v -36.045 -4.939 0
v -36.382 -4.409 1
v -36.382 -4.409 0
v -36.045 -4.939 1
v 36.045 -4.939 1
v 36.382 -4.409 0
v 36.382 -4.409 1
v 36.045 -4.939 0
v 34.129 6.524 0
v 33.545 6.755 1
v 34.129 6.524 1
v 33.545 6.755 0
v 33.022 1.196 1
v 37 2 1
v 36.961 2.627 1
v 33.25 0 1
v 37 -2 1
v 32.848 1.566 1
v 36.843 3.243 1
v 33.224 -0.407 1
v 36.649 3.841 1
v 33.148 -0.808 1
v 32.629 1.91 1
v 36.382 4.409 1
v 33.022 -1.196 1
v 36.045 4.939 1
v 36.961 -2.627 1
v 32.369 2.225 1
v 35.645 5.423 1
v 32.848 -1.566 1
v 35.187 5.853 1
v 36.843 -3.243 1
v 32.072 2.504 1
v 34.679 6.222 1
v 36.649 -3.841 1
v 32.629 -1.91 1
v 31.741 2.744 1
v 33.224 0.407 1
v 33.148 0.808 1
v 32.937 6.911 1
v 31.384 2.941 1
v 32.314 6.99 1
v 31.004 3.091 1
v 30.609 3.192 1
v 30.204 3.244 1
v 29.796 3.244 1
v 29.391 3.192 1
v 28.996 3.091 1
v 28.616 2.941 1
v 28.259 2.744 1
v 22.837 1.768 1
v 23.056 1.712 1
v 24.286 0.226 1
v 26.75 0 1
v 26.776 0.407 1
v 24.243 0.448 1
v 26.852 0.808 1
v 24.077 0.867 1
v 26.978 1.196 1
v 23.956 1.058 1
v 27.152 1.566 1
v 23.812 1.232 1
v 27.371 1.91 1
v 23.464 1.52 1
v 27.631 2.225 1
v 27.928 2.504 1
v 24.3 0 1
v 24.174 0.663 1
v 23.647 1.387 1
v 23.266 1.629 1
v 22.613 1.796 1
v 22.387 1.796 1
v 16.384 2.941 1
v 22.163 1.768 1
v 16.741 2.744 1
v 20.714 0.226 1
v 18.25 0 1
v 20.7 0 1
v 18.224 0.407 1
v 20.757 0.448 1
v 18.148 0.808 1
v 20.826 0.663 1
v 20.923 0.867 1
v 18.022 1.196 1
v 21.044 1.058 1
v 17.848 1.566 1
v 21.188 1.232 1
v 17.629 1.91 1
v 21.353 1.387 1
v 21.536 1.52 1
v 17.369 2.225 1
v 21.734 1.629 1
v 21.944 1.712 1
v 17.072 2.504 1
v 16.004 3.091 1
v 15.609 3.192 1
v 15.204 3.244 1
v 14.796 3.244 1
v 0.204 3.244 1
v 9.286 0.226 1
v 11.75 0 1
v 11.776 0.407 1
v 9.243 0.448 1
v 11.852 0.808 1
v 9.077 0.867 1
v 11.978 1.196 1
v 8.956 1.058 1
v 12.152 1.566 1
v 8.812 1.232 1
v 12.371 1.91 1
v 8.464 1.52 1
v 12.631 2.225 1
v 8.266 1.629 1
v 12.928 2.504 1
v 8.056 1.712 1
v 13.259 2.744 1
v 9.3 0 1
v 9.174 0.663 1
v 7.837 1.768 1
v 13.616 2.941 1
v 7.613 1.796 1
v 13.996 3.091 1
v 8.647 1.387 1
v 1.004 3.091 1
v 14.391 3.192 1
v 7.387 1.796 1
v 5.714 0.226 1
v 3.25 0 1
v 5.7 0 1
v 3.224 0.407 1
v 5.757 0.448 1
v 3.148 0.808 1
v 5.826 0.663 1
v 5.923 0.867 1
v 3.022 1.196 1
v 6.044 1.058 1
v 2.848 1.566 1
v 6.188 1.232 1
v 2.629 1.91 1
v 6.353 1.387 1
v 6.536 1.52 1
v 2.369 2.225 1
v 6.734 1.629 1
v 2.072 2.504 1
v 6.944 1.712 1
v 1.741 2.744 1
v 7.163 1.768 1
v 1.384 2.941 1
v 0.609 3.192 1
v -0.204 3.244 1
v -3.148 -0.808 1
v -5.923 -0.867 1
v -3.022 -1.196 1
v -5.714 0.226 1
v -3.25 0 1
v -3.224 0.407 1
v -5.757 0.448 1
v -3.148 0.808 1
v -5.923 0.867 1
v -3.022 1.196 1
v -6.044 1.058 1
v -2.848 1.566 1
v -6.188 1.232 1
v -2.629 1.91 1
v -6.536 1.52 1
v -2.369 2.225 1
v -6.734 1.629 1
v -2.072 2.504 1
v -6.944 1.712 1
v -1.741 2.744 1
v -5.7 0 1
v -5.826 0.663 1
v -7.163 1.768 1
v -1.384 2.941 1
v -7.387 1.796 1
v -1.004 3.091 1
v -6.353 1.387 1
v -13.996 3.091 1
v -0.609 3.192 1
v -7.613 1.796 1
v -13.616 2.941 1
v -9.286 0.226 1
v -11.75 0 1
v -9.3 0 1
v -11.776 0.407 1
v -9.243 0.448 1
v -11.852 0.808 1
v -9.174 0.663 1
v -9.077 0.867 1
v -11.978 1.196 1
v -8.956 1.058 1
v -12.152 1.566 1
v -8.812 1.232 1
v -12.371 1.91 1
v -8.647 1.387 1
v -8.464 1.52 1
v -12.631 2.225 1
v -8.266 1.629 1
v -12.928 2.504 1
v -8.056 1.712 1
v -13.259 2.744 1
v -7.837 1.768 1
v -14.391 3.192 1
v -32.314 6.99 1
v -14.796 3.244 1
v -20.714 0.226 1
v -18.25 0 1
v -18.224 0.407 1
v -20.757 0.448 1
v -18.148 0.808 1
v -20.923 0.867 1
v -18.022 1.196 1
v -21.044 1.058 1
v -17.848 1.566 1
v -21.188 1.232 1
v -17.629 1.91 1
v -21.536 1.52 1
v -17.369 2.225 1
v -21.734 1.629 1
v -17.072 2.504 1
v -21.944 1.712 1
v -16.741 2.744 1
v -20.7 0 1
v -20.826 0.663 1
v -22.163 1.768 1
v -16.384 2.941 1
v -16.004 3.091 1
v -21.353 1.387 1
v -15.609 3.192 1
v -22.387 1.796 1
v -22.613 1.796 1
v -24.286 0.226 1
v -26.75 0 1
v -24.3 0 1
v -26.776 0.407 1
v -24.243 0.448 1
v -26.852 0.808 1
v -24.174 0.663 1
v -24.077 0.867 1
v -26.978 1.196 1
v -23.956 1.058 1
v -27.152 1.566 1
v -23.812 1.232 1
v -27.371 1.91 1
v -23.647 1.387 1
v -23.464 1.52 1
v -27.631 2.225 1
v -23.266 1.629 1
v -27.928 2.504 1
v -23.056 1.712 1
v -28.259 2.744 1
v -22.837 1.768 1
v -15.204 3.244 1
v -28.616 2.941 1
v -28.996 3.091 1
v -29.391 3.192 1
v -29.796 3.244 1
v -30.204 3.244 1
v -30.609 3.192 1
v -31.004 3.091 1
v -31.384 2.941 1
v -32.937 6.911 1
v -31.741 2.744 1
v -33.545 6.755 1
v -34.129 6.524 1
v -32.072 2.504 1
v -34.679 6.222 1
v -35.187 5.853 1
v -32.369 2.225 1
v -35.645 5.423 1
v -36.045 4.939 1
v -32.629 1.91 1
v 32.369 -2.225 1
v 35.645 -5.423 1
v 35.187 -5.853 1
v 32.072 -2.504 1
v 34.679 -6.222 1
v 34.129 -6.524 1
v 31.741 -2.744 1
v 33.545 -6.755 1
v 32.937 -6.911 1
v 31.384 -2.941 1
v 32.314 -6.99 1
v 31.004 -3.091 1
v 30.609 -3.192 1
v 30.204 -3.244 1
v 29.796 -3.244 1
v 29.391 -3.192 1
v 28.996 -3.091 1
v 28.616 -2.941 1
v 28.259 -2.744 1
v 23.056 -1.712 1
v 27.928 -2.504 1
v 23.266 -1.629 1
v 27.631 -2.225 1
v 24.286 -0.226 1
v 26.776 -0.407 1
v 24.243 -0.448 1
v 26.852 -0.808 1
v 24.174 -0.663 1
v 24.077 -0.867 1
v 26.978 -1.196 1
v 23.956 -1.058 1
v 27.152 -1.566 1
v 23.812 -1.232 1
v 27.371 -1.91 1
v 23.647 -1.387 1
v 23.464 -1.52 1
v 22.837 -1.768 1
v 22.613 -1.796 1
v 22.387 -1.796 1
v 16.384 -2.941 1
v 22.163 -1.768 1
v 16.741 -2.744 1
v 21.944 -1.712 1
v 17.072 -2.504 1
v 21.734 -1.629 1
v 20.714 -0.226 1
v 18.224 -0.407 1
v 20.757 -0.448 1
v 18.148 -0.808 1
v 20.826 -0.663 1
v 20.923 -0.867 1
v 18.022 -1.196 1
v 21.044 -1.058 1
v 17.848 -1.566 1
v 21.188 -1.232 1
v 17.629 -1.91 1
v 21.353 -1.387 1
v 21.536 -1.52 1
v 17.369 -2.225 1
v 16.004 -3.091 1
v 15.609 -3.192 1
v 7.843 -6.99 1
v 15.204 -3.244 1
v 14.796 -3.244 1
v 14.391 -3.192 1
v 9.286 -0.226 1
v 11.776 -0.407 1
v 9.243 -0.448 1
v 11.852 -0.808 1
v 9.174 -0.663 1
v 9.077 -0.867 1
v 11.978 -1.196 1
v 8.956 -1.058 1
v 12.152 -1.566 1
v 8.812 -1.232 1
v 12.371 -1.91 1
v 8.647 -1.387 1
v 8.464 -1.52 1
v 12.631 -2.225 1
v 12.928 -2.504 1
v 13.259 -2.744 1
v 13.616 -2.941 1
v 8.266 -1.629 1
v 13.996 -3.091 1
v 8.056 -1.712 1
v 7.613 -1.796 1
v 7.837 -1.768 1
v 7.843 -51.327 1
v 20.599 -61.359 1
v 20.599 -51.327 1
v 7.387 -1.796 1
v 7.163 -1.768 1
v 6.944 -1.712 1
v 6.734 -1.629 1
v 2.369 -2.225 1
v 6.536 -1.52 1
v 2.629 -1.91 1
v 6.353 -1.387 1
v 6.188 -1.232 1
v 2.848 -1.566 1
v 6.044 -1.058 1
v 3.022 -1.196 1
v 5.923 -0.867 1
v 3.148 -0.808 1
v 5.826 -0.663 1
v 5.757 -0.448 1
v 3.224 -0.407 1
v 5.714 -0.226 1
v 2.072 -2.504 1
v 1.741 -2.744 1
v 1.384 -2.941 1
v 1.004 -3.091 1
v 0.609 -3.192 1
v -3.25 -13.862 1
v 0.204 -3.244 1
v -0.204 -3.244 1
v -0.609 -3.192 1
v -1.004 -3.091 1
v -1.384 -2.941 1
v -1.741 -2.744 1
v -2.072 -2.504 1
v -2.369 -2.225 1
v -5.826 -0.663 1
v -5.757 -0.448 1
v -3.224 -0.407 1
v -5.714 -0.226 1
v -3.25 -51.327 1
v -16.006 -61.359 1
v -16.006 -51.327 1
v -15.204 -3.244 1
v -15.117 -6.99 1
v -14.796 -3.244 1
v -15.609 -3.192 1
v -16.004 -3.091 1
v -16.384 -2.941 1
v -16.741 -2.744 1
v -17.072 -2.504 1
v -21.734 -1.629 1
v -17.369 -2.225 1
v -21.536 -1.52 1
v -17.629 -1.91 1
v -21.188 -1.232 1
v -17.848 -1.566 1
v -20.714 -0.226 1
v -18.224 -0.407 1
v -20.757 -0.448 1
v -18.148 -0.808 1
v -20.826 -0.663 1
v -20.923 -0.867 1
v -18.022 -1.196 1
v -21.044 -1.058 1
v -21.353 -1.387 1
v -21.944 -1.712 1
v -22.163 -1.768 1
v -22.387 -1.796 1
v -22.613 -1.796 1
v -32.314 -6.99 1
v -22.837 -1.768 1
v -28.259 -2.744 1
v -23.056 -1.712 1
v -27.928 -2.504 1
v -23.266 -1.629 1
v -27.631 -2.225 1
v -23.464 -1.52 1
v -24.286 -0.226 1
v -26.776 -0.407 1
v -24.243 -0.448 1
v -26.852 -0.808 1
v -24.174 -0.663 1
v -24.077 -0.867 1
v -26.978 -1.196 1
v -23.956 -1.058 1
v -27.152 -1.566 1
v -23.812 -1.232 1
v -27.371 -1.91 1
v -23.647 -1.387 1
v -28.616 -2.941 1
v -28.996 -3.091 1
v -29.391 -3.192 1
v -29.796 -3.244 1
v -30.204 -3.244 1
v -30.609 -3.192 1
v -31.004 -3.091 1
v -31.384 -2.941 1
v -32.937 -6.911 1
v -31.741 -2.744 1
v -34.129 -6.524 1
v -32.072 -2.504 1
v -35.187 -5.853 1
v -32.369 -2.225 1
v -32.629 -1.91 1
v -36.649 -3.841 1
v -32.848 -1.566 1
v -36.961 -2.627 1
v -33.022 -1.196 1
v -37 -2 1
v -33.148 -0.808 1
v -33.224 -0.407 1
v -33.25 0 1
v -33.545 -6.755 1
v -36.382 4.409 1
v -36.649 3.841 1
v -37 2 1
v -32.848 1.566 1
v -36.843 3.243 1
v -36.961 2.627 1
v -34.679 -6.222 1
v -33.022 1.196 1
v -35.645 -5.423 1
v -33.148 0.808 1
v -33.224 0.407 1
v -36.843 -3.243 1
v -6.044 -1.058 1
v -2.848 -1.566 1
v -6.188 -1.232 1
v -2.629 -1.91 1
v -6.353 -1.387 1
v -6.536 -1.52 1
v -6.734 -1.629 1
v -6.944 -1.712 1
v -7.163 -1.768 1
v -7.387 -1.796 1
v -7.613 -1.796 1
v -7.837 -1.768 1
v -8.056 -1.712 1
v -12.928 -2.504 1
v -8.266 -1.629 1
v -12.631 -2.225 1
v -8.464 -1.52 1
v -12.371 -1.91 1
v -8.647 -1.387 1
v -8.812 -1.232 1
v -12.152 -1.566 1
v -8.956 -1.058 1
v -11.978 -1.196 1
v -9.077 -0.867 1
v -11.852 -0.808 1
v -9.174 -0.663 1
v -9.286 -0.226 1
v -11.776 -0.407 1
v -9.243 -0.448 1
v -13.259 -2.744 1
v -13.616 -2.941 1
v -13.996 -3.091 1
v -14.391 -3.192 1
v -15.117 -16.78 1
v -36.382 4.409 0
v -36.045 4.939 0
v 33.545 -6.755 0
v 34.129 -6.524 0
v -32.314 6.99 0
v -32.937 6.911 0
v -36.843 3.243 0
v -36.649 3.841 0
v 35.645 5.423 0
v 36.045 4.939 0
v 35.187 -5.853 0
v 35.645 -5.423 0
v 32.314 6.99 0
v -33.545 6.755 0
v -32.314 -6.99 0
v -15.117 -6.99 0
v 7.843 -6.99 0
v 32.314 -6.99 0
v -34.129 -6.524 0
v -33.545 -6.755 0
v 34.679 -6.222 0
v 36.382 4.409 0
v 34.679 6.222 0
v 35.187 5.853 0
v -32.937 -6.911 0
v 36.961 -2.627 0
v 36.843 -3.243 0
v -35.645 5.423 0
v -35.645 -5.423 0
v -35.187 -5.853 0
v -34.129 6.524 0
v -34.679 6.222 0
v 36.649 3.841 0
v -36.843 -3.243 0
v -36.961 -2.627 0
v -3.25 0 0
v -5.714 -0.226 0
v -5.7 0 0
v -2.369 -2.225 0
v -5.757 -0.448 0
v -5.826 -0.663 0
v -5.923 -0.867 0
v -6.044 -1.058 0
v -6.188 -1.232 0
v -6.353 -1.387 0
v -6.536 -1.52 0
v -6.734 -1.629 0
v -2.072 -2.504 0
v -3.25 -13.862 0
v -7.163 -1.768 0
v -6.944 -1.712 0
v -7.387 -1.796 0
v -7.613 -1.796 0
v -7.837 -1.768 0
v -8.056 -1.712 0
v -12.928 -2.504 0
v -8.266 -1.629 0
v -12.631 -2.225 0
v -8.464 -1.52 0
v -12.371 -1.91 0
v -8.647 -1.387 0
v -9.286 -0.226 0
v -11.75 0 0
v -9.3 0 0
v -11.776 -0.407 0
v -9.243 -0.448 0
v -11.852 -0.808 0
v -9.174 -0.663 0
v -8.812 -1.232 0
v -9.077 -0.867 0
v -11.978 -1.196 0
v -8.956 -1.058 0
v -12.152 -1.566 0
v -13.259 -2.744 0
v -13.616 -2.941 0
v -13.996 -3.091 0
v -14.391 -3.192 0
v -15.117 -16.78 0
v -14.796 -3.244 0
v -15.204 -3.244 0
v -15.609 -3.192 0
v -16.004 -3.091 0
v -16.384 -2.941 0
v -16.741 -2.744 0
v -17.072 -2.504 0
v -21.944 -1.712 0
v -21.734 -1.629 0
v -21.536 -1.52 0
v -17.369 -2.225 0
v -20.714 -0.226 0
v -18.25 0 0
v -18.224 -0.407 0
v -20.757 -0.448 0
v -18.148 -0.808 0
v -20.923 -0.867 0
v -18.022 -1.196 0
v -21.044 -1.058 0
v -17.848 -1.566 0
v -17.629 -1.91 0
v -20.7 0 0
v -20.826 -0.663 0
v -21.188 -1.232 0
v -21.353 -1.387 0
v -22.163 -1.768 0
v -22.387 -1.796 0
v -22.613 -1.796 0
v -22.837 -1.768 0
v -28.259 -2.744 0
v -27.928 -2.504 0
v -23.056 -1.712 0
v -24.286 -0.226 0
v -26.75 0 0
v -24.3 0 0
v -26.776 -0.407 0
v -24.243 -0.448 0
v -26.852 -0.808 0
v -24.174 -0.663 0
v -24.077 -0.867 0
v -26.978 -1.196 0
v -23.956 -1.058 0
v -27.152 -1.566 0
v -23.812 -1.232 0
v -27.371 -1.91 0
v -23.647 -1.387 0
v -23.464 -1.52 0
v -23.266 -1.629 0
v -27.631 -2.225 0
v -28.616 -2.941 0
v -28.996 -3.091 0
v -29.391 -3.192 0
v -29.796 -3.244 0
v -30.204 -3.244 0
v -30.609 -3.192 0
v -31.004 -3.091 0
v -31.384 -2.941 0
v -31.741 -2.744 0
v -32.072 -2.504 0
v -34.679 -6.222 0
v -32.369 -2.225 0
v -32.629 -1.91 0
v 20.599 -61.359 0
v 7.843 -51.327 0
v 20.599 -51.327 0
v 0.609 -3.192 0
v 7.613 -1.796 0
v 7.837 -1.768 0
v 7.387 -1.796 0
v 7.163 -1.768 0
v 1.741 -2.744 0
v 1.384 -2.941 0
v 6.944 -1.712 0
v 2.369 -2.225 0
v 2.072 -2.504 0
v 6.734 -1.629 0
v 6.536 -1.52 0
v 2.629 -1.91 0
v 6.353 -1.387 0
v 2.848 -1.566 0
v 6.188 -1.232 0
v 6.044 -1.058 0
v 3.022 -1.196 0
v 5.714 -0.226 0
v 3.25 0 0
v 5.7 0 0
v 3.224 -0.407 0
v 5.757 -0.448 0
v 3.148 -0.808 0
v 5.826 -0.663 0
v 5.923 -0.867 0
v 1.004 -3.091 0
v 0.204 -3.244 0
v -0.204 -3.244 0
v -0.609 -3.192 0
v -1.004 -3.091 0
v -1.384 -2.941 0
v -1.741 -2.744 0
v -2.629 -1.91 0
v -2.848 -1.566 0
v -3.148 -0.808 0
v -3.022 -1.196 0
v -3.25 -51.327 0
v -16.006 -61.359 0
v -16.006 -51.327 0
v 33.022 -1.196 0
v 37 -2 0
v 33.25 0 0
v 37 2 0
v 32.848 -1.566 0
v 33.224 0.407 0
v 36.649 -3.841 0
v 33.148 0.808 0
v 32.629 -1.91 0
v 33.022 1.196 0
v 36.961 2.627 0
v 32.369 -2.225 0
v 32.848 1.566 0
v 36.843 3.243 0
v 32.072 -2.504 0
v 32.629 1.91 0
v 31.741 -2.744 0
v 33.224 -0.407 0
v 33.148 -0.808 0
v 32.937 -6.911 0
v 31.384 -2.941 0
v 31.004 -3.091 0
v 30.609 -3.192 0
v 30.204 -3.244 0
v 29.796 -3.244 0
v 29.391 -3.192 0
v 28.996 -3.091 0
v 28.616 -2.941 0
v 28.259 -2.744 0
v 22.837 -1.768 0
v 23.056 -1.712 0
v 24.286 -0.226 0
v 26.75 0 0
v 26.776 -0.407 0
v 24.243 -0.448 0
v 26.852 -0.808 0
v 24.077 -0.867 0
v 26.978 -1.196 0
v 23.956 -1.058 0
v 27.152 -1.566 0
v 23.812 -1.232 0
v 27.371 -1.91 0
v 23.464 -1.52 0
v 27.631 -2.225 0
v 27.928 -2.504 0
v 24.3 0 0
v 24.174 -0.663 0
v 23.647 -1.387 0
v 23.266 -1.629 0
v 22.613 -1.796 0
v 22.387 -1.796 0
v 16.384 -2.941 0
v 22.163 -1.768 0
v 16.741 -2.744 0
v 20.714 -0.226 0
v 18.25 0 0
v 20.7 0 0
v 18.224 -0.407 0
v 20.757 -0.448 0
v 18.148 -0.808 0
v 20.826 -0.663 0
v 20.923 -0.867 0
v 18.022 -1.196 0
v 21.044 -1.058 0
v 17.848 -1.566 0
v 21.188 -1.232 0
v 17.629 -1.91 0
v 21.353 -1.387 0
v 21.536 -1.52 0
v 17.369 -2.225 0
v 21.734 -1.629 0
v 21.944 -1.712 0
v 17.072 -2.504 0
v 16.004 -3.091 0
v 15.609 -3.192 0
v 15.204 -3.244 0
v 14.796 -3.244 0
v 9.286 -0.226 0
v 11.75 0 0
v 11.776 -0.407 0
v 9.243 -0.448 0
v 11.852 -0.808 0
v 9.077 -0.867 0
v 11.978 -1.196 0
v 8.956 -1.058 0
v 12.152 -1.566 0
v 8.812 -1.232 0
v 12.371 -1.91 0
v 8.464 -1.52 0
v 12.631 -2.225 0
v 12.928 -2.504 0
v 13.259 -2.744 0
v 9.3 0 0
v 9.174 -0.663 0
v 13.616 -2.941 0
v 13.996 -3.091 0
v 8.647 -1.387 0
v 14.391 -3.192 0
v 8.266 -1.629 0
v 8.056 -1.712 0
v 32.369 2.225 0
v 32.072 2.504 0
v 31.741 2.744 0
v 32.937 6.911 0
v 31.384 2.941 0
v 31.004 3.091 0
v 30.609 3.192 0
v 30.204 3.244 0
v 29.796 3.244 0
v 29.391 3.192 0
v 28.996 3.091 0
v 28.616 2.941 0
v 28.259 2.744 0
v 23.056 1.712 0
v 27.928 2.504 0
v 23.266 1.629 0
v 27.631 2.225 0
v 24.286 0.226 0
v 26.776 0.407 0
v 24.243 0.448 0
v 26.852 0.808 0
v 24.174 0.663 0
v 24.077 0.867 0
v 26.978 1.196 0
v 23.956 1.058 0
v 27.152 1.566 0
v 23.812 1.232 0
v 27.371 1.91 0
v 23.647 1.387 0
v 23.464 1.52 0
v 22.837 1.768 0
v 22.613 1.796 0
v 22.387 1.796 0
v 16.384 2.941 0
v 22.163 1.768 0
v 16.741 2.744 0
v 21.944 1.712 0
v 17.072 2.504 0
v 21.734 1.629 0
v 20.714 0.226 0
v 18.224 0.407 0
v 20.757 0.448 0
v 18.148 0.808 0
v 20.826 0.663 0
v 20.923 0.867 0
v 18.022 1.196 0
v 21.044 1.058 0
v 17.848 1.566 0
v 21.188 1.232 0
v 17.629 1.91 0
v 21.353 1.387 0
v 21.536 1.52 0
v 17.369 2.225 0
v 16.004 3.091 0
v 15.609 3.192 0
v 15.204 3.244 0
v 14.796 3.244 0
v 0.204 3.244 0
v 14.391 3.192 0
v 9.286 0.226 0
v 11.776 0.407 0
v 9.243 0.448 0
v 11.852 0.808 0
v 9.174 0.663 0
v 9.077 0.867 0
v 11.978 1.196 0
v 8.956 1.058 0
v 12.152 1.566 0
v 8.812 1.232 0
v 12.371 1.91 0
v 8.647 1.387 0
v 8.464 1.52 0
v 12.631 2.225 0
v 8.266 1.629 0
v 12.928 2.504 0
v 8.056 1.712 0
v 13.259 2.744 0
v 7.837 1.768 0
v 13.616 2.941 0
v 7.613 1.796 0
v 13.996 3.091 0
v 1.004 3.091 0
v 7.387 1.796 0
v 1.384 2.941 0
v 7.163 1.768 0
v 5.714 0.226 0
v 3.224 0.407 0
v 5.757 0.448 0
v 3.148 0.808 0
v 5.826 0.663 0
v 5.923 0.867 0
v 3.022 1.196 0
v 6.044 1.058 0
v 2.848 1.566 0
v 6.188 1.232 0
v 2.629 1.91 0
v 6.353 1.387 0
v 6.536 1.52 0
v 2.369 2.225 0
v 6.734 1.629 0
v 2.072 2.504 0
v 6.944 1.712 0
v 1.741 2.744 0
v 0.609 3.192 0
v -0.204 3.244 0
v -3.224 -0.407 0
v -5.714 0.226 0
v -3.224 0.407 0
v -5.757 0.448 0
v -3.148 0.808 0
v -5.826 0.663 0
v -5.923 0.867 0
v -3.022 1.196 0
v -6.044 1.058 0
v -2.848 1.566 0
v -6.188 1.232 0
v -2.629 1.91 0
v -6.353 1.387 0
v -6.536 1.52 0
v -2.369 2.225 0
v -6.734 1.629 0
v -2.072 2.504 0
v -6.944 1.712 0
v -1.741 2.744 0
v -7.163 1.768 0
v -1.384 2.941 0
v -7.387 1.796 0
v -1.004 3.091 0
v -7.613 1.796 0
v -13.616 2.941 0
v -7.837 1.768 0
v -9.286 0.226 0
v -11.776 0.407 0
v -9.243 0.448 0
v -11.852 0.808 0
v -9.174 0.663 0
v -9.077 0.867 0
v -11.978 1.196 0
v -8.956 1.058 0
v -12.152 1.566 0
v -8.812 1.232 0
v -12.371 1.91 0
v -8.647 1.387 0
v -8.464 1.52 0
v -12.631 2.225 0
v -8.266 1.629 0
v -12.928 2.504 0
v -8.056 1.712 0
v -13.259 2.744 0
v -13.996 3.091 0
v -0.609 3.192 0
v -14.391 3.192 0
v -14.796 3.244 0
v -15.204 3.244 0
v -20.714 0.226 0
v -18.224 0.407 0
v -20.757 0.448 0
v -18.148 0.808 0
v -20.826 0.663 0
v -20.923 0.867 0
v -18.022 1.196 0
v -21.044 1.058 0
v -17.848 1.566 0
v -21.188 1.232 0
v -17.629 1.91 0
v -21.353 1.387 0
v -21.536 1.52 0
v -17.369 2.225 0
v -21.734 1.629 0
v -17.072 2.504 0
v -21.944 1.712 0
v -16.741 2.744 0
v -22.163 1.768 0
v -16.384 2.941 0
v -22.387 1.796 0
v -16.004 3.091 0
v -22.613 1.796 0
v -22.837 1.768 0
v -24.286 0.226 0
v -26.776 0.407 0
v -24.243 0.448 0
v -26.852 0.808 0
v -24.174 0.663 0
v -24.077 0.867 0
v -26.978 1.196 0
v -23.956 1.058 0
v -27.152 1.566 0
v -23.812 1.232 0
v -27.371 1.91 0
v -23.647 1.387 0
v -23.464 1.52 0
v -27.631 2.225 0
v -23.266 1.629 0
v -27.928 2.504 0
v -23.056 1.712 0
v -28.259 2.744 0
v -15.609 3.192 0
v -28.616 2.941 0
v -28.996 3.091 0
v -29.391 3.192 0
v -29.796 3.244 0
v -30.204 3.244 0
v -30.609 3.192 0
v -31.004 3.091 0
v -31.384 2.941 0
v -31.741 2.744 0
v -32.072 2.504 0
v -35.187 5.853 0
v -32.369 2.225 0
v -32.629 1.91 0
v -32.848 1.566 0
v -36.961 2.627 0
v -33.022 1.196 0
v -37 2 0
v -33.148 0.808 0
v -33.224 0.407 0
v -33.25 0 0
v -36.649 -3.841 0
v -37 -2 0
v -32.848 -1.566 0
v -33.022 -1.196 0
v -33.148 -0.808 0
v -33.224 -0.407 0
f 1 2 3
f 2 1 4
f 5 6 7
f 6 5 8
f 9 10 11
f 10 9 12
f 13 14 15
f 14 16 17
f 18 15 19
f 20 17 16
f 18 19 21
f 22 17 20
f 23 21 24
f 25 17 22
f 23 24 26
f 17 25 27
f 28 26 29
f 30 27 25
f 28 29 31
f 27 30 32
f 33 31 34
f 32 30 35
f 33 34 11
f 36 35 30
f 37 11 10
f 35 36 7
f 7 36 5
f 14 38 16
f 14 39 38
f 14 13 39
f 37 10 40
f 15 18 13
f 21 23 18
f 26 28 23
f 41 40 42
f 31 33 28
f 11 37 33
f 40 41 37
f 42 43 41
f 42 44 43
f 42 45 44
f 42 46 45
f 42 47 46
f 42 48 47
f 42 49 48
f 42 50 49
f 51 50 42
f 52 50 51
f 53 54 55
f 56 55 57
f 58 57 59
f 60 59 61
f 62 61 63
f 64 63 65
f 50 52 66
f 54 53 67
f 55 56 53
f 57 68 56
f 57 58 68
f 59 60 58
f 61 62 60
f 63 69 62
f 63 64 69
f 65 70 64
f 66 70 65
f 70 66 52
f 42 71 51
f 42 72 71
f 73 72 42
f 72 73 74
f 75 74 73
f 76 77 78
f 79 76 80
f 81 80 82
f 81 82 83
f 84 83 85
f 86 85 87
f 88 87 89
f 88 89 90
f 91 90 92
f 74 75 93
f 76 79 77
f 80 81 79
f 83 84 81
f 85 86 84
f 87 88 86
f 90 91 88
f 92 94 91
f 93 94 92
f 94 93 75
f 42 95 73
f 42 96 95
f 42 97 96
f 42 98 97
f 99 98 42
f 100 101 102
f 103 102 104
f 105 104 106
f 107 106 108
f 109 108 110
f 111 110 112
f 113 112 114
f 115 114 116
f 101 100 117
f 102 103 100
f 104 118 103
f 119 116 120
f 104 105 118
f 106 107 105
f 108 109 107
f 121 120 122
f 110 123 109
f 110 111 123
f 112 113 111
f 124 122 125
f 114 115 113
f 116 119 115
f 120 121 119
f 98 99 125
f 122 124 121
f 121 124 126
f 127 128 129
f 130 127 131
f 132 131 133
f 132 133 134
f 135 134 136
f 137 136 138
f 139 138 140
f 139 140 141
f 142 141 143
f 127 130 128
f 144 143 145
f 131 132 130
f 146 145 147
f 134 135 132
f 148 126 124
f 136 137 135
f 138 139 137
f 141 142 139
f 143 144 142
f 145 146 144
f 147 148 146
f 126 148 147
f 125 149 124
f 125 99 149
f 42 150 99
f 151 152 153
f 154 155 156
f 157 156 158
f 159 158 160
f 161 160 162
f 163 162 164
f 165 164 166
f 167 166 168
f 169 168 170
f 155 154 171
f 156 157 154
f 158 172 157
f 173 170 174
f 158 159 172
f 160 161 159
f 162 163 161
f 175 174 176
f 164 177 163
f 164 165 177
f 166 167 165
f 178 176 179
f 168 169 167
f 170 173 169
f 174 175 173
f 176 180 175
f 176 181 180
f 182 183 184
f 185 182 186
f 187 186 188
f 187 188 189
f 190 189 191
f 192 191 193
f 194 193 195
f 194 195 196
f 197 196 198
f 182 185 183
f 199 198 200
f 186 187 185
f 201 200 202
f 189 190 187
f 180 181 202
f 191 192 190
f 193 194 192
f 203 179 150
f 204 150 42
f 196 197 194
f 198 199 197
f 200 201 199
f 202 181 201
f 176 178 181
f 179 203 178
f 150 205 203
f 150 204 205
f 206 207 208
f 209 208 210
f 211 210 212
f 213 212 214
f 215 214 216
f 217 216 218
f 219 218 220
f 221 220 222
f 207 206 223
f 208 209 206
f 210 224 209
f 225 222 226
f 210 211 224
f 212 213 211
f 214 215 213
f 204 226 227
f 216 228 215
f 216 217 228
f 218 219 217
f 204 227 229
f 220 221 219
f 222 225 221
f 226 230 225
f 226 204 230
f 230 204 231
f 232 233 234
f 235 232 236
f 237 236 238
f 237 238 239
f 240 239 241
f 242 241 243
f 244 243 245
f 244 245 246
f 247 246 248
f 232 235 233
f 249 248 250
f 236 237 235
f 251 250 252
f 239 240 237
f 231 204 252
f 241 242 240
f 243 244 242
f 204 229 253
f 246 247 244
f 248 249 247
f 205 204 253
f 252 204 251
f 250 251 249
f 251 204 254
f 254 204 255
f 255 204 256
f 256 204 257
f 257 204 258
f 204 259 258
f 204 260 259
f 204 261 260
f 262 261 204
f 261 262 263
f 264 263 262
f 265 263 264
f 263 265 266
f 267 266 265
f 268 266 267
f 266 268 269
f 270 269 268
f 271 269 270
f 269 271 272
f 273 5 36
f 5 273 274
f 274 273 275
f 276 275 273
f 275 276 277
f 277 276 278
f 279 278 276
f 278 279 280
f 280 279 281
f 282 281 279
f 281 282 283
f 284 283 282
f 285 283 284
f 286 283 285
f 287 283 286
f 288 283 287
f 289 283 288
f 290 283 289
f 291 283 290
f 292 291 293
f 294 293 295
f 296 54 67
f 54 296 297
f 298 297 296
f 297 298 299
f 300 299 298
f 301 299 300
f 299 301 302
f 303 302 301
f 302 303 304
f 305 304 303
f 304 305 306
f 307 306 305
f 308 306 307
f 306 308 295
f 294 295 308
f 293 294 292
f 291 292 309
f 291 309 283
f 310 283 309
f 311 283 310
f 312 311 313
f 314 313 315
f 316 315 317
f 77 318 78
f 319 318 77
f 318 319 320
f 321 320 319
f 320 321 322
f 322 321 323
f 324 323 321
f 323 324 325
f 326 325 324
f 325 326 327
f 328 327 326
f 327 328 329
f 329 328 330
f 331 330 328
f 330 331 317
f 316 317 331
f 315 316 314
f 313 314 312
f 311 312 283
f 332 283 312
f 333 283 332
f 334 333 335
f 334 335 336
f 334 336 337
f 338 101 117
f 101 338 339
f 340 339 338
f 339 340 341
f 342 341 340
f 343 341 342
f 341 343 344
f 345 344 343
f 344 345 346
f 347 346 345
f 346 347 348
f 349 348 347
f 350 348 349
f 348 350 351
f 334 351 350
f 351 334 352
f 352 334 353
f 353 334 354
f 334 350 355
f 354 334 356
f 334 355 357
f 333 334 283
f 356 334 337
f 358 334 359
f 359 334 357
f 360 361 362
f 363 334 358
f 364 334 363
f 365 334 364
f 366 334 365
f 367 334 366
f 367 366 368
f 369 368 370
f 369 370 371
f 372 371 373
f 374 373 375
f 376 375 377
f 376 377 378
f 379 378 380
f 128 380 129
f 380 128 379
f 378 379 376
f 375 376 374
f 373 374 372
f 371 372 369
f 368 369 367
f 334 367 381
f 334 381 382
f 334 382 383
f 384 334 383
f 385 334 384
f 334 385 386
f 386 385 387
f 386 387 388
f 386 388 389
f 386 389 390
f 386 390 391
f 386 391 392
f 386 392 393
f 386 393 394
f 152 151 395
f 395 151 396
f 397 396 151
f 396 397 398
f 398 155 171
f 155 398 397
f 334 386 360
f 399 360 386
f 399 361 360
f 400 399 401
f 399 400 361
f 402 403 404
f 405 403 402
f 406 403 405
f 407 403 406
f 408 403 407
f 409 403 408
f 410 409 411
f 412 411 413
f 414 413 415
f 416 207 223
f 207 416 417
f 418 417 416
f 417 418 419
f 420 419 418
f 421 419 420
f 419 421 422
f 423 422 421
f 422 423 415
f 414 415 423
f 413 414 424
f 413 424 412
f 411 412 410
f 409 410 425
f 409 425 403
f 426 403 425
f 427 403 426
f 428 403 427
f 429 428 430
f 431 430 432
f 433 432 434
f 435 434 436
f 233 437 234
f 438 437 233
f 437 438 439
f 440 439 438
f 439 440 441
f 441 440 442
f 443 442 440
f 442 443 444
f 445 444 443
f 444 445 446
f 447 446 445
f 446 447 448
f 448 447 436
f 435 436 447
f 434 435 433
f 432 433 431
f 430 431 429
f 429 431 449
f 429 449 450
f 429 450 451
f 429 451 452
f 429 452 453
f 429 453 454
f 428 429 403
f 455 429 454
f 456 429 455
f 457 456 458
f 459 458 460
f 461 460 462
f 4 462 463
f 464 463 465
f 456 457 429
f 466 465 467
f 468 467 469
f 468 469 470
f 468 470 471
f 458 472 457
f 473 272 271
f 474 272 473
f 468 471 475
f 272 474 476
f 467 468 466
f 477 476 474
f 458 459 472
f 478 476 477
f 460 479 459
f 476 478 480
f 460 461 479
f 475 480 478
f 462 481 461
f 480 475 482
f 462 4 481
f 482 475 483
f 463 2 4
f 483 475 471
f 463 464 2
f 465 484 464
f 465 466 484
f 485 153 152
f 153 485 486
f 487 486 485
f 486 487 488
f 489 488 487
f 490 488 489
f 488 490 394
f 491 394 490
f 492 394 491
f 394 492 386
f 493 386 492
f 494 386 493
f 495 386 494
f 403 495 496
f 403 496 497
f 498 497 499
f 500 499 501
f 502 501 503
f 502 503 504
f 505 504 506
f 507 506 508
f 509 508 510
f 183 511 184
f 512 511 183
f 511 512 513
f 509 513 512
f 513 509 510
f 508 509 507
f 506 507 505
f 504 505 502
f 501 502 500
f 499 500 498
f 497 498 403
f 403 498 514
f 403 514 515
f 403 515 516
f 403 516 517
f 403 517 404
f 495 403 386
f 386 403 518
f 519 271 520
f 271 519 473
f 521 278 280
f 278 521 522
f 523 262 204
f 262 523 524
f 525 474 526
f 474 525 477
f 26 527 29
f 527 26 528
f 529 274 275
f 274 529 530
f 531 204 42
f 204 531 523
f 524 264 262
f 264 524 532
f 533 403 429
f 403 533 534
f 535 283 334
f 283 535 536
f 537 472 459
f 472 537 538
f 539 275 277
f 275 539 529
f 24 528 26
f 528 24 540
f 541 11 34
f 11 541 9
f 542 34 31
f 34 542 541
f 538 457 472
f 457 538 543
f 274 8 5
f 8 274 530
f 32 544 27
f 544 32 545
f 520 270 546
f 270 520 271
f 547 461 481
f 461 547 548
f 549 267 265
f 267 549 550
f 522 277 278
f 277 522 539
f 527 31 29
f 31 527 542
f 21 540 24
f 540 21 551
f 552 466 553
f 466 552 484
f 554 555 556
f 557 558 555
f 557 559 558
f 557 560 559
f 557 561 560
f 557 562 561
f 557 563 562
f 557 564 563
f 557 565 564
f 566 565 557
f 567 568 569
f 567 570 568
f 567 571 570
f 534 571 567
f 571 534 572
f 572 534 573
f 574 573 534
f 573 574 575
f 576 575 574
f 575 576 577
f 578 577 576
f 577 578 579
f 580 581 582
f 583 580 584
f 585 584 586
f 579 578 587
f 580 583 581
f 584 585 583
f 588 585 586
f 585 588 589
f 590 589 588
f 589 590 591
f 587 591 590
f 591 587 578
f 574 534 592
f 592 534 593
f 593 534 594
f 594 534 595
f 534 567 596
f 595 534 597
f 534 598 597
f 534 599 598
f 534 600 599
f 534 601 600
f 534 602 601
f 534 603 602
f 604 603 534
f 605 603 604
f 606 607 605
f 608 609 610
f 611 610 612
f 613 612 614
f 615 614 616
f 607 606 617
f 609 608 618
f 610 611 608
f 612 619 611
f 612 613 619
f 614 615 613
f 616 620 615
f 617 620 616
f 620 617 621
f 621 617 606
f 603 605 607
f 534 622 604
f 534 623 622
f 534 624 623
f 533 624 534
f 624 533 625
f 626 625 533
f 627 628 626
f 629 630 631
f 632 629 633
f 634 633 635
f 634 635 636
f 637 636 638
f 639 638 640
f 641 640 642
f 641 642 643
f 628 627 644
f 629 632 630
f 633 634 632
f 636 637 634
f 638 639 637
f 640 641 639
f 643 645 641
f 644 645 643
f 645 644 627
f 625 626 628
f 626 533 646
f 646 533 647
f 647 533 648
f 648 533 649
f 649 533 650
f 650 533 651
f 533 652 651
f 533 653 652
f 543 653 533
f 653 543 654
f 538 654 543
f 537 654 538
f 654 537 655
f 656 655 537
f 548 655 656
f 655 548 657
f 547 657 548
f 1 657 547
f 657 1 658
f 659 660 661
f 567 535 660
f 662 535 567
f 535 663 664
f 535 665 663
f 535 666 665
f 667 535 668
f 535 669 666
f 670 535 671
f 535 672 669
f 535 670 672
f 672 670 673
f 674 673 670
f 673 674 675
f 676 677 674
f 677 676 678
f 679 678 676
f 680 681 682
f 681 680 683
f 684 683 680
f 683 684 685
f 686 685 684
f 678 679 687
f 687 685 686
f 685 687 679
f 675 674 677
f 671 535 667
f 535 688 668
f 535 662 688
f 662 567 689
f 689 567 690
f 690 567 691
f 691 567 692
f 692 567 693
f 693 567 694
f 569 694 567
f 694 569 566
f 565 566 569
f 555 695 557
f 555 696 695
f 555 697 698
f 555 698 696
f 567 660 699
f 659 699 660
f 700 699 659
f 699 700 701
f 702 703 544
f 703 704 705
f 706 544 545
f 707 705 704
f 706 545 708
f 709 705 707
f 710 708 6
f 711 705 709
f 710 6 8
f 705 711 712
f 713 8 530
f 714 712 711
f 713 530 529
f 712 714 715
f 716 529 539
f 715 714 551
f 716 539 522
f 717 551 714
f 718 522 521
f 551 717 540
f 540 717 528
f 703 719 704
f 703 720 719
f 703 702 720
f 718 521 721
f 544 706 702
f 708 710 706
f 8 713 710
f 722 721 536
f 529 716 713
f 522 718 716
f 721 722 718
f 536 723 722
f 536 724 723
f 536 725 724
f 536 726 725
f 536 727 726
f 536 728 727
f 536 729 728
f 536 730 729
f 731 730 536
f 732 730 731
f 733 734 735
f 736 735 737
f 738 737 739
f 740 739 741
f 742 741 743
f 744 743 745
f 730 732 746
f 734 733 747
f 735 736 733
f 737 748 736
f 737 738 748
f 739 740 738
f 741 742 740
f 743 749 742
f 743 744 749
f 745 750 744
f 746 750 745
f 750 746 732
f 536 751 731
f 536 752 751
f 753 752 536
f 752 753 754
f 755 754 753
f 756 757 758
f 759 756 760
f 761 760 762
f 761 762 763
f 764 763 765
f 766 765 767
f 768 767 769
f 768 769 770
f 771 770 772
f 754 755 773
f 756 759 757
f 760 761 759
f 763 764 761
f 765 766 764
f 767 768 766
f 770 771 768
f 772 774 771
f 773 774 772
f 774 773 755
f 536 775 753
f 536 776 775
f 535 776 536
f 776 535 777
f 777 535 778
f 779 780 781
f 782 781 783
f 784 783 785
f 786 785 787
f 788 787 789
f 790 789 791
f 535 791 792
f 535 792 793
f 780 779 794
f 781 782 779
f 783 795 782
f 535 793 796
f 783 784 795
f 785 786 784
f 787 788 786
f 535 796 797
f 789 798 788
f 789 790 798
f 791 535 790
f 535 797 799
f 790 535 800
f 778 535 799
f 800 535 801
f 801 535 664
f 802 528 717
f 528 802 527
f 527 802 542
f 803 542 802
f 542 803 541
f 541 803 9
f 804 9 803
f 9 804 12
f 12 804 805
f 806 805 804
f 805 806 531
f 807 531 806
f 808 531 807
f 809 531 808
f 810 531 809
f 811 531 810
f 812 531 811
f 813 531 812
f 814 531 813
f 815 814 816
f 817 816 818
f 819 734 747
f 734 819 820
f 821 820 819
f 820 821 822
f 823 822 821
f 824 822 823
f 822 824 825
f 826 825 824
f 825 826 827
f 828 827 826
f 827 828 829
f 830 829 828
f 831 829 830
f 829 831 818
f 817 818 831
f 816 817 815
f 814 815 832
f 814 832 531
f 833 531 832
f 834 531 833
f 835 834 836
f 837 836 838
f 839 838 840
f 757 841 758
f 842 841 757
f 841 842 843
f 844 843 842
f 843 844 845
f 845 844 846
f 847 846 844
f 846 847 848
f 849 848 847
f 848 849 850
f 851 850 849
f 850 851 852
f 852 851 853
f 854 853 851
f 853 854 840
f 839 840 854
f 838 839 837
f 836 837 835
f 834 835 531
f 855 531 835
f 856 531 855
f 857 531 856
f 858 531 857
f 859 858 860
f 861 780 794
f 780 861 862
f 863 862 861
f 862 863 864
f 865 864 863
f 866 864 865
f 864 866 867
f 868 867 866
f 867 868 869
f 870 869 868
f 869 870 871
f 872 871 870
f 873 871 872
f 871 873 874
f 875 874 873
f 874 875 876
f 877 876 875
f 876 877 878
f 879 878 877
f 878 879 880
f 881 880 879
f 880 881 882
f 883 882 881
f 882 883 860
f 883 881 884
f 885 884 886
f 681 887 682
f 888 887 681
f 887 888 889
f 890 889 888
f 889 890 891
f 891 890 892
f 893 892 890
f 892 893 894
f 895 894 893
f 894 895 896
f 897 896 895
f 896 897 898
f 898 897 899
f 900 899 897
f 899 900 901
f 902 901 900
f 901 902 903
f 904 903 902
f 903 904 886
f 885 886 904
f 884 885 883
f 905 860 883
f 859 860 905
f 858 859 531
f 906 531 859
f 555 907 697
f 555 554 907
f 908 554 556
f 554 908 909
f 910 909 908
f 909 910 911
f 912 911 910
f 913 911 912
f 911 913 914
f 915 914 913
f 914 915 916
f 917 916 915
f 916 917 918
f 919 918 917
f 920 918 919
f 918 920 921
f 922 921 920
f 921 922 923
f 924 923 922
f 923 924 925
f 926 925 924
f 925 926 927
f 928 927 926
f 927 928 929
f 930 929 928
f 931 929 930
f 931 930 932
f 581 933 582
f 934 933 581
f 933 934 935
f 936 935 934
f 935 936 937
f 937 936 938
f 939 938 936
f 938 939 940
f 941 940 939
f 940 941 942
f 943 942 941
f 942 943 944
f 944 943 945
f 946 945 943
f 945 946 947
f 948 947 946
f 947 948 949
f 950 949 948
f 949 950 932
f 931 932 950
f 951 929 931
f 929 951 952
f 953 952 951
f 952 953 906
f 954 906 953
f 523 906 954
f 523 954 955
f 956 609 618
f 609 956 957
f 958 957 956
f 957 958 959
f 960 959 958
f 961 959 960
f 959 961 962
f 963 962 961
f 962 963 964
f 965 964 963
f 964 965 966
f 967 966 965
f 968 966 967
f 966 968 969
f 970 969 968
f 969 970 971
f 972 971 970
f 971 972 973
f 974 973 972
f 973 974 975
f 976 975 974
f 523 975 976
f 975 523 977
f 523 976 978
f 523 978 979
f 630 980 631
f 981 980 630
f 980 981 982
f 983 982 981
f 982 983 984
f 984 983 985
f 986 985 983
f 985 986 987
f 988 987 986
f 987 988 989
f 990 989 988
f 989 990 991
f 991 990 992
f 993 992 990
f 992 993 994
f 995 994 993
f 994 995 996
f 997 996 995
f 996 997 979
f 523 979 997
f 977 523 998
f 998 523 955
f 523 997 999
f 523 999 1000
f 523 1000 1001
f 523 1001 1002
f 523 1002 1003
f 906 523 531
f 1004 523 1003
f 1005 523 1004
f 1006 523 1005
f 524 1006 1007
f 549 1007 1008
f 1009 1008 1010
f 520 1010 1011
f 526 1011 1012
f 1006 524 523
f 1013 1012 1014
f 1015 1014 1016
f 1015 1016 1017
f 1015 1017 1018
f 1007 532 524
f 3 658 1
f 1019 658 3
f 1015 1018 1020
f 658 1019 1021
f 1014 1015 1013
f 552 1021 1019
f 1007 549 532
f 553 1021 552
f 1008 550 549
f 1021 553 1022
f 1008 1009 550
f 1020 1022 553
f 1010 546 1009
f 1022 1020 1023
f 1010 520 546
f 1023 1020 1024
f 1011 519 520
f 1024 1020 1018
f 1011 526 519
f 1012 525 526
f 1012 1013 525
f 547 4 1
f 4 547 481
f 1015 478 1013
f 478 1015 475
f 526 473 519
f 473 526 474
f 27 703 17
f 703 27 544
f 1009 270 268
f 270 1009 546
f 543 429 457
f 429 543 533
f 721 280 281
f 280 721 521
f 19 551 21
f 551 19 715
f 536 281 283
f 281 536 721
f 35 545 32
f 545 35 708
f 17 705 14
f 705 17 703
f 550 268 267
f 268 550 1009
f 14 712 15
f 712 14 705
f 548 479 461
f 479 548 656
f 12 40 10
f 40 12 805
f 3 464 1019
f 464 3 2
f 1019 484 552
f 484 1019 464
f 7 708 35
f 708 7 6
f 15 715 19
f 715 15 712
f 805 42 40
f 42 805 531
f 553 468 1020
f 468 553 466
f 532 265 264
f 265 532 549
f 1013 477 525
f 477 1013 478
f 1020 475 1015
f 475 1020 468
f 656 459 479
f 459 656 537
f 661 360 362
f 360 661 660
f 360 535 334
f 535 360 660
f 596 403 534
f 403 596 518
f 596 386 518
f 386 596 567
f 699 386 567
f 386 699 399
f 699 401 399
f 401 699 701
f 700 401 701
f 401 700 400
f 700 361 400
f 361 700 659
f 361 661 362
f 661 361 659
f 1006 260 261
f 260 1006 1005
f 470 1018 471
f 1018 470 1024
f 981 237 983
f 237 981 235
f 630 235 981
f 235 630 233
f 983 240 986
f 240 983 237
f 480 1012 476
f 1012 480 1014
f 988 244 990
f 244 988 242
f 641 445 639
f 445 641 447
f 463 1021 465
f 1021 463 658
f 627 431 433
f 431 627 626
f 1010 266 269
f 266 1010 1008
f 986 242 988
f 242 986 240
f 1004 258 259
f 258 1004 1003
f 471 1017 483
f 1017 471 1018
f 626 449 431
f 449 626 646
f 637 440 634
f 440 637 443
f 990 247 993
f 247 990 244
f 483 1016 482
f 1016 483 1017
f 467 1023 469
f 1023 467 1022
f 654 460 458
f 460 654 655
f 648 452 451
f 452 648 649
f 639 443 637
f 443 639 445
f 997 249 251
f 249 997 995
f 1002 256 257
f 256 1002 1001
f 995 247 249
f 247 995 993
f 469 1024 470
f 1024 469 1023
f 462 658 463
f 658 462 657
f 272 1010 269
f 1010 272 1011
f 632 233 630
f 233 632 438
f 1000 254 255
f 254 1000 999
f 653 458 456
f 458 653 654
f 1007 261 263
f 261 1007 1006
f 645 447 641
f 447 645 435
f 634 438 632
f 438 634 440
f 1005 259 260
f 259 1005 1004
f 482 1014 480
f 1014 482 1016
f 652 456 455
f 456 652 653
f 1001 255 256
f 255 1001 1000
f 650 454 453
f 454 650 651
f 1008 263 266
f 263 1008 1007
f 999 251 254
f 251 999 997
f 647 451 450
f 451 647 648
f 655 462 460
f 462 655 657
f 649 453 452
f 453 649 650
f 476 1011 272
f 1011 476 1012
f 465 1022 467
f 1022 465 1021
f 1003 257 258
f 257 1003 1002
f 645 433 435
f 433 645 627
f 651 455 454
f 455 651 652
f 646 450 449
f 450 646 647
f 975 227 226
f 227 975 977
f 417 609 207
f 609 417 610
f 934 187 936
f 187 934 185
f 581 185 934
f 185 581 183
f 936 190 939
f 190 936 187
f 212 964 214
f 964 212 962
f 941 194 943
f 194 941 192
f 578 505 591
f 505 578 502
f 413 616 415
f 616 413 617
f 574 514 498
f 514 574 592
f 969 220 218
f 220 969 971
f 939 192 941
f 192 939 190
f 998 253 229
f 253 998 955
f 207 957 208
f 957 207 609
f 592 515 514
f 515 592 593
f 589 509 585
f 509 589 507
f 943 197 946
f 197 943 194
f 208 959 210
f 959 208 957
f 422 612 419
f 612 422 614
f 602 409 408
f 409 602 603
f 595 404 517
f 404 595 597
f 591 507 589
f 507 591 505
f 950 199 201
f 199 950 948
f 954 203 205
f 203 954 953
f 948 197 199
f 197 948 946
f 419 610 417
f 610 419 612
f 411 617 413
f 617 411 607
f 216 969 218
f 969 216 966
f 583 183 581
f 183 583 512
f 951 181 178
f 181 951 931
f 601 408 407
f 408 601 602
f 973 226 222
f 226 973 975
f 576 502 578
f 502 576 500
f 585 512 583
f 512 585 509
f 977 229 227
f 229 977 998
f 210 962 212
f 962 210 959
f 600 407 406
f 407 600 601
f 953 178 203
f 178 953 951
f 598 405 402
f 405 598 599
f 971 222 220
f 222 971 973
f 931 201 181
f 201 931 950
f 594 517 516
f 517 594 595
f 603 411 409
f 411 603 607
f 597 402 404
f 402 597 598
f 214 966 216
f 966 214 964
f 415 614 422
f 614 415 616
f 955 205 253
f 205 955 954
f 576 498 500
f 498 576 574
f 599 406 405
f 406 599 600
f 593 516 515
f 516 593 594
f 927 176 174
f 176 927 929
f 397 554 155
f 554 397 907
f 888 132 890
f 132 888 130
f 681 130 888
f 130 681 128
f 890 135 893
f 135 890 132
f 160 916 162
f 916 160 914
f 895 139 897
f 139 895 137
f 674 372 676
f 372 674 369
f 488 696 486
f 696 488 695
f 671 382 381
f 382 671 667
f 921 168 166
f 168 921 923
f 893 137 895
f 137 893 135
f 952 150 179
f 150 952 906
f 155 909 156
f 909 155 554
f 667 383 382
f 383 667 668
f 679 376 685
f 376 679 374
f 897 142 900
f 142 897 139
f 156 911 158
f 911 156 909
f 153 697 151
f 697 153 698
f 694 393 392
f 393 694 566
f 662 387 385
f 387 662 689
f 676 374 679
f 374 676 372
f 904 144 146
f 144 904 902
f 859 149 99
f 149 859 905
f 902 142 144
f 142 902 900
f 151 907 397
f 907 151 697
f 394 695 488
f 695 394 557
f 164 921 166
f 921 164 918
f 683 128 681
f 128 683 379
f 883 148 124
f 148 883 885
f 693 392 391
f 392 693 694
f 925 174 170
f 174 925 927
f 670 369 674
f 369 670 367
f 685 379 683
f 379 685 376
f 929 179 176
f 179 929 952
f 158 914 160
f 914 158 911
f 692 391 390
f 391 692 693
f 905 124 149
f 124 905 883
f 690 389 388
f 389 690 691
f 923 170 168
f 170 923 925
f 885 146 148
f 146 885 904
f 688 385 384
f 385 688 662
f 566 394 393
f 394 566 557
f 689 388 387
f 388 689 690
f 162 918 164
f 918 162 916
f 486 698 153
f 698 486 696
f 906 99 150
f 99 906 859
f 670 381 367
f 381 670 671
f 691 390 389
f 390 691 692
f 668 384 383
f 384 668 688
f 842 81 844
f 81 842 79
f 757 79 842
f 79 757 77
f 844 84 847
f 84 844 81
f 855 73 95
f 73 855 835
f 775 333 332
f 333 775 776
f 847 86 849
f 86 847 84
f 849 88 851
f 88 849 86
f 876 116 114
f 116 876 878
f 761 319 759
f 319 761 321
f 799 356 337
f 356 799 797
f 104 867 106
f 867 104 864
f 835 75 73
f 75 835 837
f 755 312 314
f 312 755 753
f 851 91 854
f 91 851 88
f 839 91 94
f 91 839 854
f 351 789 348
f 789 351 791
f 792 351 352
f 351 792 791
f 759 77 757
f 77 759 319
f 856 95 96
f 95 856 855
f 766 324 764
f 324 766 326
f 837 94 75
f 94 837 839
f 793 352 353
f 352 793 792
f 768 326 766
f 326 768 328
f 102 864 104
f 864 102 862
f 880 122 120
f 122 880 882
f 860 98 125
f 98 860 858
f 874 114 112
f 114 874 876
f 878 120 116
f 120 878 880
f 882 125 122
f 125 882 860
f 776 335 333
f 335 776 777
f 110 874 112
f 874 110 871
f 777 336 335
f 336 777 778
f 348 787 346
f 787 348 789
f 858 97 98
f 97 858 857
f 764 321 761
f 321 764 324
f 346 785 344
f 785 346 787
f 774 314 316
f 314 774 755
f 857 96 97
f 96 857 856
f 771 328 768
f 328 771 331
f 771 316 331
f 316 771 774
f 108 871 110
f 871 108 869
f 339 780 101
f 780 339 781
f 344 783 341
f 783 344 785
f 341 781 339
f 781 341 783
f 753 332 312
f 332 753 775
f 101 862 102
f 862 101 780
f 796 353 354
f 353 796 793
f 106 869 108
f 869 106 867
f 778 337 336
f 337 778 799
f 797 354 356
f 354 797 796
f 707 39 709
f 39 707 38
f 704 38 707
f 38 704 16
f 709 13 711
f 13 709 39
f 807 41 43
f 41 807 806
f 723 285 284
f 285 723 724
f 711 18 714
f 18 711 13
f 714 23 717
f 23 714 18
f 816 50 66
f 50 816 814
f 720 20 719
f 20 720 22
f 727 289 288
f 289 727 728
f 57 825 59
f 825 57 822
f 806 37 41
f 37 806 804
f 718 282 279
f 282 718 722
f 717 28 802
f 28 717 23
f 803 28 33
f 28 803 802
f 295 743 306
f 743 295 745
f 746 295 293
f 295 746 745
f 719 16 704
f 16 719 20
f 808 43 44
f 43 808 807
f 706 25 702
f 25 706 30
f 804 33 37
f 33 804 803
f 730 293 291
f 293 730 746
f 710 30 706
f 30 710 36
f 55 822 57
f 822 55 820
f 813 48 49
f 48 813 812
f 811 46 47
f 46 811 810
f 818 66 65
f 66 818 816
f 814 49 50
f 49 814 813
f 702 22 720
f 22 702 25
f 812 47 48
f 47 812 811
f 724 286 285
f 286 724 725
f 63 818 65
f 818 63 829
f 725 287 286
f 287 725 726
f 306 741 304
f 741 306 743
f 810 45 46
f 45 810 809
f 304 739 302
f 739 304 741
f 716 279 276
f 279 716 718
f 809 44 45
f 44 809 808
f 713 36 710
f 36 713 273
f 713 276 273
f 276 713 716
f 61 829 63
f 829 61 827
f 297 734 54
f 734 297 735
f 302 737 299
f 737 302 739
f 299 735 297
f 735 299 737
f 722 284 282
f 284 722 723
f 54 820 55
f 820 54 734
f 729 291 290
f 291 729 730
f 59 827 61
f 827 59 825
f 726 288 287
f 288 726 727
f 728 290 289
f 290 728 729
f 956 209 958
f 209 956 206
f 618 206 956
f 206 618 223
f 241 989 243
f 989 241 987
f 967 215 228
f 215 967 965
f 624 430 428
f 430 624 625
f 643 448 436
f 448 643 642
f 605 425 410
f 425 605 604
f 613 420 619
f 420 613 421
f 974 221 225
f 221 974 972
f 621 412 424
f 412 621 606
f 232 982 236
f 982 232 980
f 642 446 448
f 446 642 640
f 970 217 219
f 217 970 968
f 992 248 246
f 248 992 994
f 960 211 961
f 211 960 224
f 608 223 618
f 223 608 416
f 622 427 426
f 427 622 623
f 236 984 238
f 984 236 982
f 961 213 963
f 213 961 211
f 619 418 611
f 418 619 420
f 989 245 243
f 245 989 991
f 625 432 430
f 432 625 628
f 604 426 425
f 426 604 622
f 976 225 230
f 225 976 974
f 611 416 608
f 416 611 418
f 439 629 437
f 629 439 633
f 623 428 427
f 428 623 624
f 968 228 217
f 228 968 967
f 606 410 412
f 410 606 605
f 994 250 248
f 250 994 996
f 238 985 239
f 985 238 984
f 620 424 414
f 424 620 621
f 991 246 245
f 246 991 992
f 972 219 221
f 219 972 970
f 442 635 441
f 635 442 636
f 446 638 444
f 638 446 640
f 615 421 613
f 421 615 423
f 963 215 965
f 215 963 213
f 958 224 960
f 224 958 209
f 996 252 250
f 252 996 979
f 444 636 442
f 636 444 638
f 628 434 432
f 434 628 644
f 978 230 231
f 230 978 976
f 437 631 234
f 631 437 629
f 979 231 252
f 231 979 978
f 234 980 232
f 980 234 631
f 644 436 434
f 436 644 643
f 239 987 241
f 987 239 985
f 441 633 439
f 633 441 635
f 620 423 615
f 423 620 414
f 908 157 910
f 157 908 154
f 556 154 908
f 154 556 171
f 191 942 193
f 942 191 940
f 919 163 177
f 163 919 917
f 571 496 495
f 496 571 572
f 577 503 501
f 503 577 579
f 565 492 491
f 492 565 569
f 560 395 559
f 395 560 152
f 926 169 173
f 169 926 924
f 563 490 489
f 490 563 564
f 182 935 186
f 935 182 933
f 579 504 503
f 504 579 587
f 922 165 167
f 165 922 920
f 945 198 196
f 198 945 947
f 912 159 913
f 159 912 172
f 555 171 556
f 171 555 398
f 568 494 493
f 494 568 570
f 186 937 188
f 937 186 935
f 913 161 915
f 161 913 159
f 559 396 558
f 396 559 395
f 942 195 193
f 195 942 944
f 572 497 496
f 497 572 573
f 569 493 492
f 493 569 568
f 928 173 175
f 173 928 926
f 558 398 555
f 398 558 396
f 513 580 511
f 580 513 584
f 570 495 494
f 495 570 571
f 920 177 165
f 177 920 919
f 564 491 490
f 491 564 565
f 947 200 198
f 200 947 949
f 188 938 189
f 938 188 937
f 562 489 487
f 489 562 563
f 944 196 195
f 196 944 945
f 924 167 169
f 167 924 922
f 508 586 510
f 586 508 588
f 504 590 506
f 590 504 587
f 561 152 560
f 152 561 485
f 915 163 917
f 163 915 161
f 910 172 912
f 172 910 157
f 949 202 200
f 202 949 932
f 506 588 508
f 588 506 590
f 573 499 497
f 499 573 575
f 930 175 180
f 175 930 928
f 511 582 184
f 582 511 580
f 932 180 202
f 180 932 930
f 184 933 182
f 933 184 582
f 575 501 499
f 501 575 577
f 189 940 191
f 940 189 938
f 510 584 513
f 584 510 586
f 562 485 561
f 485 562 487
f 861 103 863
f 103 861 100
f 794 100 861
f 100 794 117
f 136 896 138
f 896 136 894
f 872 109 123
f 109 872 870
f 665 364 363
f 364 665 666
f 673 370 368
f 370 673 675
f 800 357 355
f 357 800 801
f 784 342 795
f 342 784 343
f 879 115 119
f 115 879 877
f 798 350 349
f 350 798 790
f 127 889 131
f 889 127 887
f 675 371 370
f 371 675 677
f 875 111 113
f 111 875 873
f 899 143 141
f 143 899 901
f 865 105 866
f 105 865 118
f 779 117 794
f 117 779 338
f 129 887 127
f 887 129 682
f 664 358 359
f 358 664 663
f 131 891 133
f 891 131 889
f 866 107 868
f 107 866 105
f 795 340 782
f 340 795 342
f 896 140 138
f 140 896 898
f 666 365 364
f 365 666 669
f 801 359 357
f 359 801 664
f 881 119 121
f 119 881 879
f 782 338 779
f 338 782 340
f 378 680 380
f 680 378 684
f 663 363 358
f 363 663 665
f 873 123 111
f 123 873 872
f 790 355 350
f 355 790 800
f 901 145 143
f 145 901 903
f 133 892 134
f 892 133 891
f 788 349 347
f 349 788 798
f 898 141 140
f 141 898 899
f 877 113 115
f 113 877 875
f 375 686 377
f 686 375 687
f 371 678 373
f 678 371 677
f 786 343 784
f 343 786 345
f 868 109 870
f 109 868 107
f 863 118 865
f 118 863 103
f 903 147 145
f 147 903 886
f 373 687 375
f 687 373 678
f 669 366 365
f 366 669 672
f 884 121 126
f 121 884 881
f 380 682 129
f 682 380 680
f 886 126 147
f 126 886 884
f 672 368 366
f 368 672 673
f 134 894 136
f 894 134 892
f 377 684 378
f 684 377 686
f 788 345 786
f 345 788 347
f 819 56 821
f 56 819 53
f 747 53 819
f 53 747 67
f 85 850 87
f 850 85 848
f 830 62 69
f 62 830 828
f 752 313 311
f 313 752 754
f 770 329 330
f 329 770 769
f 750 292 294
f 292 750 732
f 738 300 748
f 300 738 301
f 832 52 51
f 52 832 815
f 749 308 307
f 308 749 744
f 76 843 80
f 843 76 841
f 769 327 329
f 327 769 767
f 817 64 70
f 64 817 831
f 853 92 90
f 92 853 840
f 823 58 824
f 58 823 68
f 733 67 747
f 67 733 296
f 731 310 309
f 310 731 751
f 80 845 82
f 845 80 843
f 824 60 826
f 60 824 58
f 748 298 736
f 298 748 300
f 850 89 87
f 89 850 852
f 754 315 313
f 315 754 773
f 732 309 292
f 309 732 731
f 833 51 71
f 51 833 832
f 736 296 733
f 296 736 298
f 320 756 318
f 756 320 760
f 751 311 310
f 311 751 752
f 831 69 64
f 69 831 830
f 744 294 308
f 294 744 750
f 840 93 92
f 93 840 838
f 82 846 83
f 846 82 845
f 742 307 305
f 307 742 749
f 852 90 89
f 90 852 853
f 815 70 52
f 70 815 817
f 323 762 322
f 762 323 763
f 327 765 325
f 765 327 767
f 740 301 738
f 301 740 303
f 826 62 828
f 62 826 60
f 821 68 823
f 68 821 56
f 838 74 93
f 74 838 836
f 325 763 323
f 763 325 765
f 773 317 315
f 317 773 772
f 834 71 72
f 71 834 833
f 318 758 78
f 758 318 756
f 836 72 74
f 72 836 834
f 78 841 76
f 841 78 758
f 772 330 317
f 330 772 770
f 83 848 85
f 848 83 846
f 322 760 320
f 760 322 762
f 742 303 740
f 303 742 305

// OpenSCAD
$fn = 50;


difference() {
	union() {
		hull() {
			translate(v = [-32.0000000000, 2.0000000000, 0]) {
				cylinder(h = 1, r = 5);
			}
			translate(v = [32.0000000000, 2.0000000000, 0]) {
				cylinder(h = 1, r = 5);
			}
			translate(v = [-32.0000000000, -2.0000000000, 0]) {
				cylinder(h = 1, r = 5);
			}
			translate(v = [32.0000000000, -2.0000000000, 0]) {
				cylinder(h = 1, r = 5);
			}
		}
		translate(v = [0, -5, 0]) {
			linear_extrude(height = 1) {
				text(font = "DejaVu Sans Mono:style=Bold", halign = "center", size = 57.0000000000, text = "1", valign = "top");
			}
		}
	}
	union() {
		translate(v = [-30.0000000000, 0.0000000000, 0]) {
			translate(v = [0, 0, -100]) {
				cylinder(h = 200, r = 3.2500000000);
			}
		}
		translate(v = [-15.0000000000, 0.0000000000, 0]) {
			translate(v = [0, 0, -100]) {
				cylinder(h = 200, r = 3.2500000000);
			}
		}
		translate(v = [0, 0, -100]) {
			cylinder(h = 200, r = 3.2500000000);
		}
		translate(v = [15.0000000000, 0.0000000000, 0]) {
			translate(v = [0, 0, -100]) {
				cylinder(h = 200, r = 3.2500000000);
			}
		}
		translate(v = [30.0000000000, 0.0000000000, 0]) {
			translate(v = [0, 0, -100]) {
				cylinder(h = 200, r = 3.2500000000);
			}
		}
		translate(v = [-30.0000000000, 0.0000000000, 0]) {
			translate(v = [0, 0, -100]) {
				cylinder(h = 200, r = 1.8000000000);
			}
		}
		translate(v = [-22.5000000000, 0.0000000000, 0]) {
			translate(v = [0, 0, -100]) {
				cylinder(h = 200, r = 1.8000000000);
			}
		}
		translate(v = [-15.0000000000, 0.0000000000, 0]) {
			translate(v = [0, 0, -100]) {
				cylinder(h = 200, r = 1.8000000000);
			}
		}
		translate(v = [-7.5000000000, 0.0000000000, 0]) {
			translate(v = [0, 0, -100]) {
				cylinder(h = 200, r = 1.8000000000);
			}
		}
		translate(v = [0, 0, -100]) {
			cylinder(h = 200, r = 1.8000000000);
		}
		translate(v = [7.5000000000, 0.0000000000, 0]) {
			translate(v = [0, 0, -100]) {
				cylinder(h = 200, r = 1.8000000000);
			}
		}
		translate(v = [15.0000000000, 0.0000000000, 0]) {
			translate(v = [0, 0, -100]) {
				cylinder(h = 200, r = 1.8000000000);
			}
		}
		translate(v = [22.5000000000, 0.0000000000, 0]) {
			translate(v = [0, 0, -100]) {
				cylinder(h = 200, r = 1.8000000000);
			}
		}
		translate(v = [30.0000000000, 0.0000000000, 0]) {
			translate(v = [0, 0, -100]) {
				cylinder(h = 200, r = 1.8000000000);
			}
		}
	}
}
